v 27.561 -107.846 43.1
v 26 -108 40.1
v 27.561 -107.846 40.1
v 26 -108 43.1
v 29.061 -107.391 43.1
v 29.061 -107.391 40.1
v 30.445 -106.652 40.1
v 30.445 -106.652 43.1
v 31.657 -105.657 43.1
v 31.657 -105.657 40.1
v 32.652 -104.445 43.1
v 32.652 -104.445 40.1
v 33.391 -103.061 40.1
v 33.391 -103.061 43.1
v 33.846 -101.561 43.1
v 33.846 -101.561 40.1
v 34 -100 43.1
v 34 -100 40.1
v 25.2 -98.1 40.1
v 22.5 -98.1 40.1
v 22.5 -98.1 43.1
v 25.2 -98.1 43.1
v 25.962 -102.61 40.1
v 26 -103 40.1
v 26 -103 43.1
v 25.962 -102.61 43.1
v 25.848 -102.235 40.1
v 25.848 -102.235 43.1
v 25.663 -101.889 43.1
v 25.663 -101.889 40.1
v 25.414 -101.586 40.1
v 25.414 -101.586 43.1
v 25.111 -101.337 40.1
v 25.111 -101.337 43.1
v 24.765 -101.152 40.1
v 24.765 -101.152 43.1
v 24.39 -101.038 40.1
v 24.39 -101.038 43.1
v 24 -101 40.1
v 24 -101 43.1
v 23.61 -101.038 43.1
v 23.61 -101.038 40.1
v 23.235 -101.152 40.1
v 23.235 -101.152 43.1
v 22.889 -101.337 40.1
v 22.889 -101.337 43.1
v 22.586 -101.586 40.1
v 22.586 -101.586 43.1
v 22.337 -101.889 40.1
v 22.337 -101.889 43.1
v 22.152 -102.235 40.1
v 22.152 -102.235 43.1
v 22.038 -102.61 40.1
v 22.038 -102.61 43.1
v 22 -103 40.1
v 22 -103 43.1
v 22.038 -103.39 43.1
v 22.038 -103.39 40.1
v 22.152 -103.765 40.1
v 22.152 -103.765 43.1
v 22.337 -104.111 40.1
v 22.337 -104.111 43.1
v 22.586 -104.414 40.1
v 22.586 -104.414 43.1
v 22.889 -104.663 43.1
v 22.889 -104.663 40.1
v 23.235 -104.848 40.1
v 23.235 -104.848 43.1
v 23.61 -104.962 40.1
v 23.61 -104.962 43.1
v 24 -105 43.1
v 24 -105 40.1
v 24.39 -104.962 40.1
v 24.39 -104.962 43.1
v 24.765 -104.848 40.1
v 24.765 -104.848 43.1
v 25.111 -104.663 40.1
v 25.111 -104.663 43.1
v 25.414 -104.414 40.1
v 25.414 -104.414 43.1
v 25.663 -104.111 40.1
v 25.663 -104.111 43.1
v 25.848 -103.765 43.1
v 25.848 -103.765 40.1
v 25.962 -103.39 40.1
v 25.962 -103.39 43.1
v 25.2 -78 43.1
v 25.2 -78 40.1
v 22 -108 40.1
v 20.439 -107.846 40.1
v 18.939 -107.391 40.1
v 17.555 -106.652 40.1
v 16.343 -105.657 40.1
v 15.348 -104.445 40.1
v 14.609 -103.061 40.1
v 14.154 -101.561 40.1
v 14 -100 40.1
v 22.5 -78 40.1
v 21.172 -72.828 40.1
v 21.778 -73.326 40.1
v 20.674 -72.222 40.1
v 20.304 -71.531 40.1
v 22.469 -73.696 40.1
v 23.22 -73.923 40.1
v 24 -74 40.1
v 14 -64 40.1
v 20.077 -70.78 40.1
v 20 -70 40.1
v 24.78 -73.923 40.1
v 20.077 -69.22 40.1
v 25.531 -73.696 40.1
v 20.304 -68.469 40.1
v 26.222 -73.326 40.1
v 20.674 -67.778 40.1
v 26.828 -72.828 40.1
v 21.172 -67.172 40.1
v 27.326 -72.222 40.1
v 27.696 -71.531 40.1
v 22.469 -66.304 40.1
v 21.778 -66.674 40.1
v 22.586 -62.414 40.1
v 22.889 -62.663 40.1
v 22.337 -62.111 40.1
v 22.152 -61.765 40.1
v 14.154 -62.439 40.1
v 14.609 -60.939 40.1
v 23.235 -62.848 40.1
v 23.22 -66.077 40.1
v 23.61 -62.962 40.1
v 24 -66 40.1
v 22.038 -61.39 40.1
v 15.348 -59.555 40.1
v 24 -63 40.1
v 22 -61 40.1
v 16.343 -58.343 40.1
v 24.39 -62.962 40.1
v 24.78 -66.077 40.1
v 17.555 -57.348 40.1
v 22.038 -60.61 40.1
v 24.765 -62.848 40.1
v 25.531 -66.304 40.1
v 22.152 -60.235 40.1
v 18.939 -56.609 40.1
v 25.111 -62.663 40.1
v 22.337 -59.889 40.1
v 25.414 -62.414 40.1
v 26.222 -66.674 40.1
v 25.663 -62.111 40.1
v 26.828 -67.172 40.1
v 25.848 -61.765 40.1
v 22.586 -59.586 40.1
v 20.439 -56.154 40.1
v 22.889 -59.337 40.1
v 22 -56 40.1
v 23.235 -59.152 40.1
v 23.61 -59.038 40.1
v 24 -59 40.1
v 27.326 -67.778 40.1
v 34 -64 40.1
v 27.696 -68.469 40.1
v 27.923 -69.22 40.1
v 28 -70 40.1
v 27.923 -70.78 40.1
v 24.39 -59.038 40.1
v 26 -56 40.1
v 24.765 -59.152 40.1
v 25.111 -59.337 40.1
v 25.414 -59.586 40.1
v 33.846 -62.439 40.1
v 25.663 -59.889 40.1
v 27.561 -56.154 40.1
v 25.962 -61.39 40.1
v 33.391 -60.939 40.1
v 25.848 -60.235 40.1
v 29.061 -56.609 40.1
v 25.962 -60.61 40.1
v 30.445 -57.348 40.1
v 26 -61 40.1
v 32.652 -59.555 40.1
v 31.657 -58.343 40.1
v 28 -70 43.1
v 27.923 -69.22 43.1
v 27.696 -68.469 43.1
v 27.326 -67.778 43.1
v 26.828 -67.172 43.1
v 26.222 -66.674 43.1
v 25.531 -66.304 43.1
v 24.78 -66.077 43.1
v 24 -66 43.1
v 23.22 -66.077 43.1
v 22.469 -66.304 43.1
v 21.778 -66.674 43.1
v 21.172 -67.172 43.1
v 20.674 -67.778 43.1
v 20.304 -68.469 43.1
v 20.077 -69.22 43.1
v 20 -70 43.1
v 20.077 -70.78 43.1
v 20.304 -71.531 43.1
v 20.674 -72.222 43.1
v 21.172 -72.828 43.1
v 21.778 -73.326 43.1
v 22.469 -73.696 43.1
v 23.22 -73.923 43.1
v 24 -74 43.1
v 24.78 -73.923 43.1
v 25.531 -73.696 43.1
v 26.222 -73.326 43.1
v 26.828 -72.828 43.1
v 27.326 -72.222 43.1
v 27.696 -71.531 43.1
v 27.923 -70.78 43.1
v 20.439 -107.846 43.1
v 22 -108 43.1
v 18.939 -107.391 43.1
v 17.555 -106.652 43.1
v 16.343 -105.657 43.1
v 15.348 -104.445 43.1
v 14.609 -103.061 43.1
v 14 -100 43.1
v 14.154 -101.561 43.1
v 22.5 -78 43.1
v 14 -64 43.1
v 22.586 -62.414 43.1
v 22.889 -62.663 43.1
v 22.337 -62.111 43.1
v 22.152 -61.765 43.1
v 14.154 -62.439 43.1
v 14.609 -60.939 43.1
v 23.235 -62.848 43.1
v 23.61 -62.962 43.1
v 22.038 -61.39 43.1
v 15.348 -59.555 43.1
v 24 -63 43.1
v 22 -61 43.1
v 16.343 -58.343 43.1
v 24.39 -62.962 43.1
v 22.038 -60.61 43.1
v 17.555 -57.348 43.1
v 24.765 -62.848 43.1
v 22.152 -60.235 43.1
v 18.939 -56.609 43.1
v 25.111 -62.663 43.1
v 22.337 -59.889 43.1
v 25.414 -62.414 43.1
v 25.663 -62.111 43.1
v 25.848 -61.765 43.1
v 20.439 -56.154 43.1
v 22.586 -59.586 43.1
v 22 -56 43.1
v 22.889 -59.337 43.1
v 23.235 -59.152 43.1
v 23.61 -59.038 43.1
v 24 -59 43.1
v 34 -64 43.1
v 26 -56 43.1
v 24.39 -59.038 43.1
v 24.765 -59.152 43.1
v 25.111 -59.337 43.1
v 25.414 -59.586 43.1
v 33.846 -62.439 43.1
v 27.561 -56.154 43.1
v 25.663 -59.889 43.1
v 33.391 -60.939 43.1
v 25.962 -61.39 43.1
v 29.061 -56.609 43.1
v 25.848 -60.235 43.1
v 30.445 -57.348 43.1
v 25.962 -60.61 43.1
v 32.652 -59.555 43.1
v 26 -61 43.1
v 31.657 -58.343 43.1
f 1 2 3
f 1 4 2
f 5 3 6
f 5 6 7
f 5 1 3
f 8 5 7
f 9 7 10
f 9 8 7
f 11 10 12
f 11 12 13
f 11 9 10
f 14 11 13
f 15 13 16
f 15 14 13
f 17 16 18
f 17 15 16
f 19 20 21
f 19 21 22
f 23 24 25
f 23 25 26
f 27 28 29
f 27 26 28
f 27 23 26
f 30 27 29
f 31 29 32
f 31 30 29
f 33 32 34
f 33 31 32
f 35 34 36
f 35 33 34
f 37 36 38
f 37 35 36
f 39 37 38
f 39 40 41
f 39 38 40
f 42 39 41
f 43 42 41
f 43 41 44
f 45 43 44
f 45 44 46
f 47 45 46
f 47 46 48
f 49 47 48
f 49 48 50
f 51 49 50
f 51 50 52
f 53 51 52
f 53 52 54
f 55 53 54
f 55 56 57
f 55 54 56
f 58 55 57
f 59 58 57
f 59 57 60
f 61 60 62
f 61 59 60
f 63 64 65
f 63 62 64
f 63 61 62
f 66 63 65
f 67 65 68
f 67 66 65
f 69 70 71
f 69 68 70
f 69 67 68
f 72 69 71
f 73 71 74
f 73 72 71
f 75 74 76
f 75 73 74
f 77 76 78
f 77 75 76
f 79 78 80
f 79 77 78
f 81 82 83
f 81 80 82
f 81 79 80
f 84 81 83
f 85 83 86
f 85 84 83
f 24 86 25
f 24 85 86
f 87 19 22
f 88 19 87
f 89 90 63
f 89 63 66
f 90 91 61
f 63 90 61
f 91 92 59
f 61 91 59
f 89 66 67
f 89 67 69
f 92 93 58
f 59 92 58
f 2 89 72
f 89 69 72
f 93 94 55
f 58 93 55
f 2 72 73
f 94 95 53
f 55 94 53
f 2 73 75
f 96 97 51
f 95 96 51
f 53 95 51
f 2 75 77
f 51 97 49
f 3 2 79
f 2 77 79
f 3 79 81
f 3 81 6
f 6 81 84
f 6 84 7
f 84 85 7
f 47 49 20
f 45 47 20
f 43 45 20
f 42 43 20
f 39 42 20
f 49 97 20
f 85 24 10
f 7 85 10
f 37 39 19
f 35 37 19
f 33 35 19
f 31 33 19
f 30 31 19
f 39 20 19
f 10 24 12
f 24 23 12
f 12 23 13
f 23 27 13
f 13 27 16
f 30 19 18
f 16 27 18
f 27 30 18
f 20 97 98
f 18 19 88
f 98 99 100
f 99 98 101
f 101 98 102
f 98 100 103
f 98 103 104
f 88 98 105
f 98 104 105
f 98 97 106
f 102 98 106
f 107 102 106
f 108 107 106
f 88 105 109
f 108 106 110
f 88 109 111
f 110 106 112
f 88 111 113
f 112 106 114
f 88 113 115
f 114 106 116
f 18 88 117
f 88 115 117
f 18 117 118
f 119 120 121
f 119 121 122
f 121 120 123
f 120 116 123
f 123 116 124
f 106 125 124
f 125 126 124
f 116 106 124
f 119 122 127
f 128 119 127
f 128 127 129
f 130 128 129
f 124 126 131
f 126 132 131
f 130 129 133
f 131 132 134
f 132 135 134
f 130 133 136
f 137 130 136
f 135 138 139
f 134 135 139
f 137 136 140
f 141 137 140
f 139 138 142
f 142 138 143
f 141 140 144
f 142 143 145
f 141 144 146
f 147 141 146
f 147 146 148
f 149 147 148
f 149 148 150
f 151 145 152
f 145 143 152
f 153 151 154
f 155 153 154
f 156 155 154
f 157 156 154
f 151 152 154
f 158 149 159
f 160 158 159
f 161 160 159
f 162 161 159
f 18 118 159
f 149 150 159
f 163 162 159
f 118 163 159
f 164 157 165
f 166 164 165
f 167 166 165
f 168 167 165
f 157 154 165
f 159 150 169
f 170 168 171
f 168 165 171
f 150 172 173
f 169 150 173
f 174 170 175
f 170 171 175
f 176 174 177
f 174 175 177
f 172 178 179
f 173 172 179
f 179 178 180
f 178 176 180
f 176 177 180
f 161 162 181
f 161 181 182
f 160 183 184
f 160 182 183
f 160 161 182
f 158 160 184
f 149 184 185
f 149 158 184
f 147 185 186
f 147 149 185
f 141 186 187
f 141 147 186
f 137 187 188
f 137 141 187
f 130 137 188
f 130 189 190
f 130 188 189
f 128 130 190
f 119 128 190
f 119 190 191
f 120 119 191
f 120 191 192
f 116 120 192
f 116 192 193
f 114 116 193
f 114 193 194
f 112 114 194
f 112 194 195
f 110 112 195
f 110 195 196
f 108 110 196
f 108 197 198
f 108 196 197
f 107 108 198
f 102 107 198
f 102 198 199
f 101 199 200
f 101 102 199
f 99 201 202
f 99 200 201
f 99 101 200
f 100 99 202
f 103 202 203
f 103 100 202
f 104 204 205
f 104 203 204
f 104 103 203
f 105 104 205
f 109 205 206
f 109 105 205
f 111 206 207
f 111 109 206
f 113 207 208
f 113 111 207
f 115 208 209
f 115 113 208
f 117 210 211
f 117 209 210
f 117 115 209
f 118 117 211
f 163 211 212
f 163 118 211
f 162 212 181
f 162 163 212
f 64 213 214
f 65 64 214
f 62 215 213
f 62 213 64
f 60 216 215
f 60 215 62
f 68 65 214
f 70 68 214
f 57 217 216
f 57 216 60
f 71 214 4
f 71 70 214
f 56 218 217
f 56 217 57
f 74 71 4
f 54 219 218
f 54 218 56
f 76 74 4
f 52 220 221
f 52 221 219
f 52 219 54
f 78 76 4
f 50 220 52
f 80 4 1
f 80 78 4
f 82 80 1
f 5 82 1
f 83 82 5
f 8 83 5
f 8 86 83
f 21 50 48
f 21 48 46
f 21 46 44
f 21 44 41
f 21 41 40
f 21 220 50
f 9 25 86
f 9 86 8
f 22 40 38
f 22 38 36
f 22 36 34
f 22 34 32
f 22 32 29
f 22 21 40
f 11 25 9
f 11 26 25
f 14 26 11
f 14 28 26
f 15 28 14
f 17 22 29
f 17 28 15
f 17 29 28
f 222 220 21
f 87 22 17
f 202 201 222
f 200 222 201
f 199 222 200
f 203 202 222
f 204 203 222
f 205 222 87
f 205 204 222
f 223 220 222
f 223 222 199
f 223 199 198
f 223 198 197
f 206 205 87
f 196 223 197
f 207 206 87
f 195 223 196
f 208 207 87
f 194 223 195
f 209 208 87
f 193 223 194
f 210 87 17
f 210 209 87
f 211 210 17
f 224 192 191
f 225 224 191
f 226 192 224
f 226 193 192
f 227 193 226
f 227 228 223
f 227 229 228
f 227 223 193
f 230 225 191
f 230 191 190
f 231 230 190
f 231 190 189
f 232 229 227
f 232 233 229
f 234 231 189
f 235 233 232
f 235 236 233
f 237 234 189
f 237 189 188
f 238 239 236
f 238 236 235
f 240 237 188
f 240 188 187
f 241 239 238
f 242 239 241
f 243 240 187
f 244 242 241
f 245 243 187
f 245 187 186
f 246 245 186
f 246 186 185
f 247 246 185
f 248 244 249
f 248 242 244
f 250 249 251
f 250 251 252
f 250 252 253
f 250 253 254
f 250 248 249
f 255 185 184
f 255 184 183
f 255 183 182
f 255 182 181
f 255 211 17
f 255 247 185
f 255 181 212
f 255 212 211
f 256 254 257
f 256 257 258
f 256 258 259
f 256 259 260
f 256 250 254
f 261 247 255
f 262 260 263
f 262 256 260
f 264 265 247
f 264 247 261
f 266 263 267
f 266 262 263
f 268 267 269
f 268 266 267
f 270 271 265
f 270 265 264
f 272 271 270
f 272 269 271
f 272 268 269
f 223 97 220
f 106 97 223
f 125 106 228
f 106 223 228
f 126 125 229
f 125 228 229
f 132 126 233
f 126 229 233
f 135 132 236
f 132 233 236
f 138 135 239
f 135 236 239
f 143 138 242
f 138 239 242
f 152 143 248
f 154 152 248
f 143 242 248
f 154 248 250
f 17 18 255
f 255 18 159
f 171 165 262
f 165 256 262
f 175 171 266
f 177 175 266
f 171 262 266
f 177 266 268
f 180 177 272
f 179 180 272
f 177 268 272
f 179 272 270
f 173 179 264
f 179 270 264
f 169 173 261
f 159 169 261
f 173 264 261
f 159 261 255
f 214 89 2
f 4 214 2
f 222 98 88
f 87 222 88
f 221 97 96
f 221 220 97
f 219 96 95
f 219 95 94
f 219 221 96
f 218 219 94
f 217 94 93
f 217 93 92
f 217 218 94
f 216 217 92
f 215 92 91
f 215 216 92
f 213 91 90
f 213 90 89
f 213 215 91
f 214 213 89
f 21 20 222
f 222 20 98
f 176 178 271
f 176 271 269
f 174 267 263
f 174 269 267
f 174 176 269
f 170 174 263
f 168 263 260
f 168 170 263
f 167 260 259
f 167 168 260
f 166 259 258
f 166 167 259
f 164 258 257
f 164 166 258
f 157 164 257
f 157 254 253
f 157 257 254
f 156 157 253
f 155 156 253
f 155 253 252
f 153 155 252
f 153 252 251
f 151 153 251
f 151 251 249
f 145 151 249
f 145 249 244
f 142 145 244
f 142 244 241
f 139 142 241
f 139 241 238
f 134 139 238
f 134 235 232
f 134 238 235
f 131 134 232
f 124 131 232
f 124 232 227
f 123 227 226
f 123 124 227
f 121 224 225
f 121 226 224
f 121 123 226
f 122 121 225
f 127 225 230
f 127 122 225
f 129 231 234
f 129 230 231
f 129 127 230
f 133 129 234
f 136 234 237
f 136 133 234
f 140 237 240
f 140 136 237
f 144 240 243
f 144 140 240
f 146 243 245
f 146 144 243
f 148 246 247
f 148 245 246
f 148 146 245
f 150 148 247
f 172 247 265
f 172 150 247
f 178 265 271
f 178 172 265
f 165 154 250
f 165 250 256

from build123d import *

# Parameters (mm, degrees)
CYLINDER372_R     = 2
CYLINDER372_DEPTH = 70
CYLINDER373_R     = 2
CYLINDER373_DEPTH = 70
CYLINDER369_R     = 4
CYLINDER369_DEPTH = 5
BOX463_W          = 2.7
BOX463_H          = 20.1
BOX463_DEPTH      = 5
BOX459_W          = 20
BOX459_H          = 52
BOX459_DEPTH      = 3
FILLET016_R       = 8


with BuildPart() as cylinder372:
    # Cylinder372 → Cylinder372 (new body)
    with BuildSketch(Plane(origin=(-90, -103, -10), x_dir=(1, 0, 0), z_dir=(0, 0, 1))):
        Circle(CYLINDER372_R)
    extrude(amount=CYLINDER372_DEPTH)


with BuildPart() as fusion369:
    # Cylinder373 → Cylinder373 (new body)
    with BuildSketch(Plane(origin=(-90, -61, -10), x_dir=(1, 0, 0), z_dir=(0, 0, 1))):
        Circle(CYLINDER373_R)
    extrude(amount=CYLINDER373_DEPTH)

    # Fusion369: union Cylinder372
    add(cylinder372.part)


with BuildPart() as fusion369_1:
    # Fusion369 placement: moved
    add(fusion369.part.moved(Location((114, 0, 0))))


with BuildPart() as cylinder369:
    # Cylinder369 → Cylinder369 (new body)
    with BuildSketch(Plane(origin=(24, -70, 39), x_dir=(1, 0, 0), z_dir=(0, 0, 1))):
        Circle(CYLINDER369_R)
    extrude(amount=CYLINDER369_DEPTH)


with BuildPart() as box463:
    # Box463 → Box463 (new body)
    with BuildSketch(Plane(origin=(22.5, -98.1, 39), x_dir=(1, 0, 0), z_dir=(0, 0, 1))):
        with Locations((1.35, 10.05)):
            Rectangle(BOX463_W, BOX463_H)
    extrude(amount=BOX463_DEPTH)


with BuildPart() as cut402:
    # Box459 → Box459 (new body)
    with BuildSketch(Plane(origin=(14, -108, 40.1), x_dir=(1, 0, 0), z_dir=(0, 0, 1))):
        with Locations((10, 26)):
            Rectangle(BOX459_W, BOX459_H)
    extrude(amount=BOX459_DEPTH)

    # Cut397: cut Box463
    add(box463.part, mode=Mode.SUBTRACT)

    # Fillet016
    fillet016_edges = [cut402.edges().sort_by_distance(p)[0] for p in [
        (14, -108, 41.6),
        (14, -56, 41.6),
        (34, -108, 41.6),
        (34, -56, 41.6),
    ]]
    fillet(fillet016_edges, radius=FILLET016_R)

    # Cut400: cut Cylinder369
    add(cylinder369.part, mode=Mode.SUBTRACT)

    # Cut402: cut Fusion369
    add(fusion369_1.part, mode=Mode.SUBTRACT)


solid = cut402.part
